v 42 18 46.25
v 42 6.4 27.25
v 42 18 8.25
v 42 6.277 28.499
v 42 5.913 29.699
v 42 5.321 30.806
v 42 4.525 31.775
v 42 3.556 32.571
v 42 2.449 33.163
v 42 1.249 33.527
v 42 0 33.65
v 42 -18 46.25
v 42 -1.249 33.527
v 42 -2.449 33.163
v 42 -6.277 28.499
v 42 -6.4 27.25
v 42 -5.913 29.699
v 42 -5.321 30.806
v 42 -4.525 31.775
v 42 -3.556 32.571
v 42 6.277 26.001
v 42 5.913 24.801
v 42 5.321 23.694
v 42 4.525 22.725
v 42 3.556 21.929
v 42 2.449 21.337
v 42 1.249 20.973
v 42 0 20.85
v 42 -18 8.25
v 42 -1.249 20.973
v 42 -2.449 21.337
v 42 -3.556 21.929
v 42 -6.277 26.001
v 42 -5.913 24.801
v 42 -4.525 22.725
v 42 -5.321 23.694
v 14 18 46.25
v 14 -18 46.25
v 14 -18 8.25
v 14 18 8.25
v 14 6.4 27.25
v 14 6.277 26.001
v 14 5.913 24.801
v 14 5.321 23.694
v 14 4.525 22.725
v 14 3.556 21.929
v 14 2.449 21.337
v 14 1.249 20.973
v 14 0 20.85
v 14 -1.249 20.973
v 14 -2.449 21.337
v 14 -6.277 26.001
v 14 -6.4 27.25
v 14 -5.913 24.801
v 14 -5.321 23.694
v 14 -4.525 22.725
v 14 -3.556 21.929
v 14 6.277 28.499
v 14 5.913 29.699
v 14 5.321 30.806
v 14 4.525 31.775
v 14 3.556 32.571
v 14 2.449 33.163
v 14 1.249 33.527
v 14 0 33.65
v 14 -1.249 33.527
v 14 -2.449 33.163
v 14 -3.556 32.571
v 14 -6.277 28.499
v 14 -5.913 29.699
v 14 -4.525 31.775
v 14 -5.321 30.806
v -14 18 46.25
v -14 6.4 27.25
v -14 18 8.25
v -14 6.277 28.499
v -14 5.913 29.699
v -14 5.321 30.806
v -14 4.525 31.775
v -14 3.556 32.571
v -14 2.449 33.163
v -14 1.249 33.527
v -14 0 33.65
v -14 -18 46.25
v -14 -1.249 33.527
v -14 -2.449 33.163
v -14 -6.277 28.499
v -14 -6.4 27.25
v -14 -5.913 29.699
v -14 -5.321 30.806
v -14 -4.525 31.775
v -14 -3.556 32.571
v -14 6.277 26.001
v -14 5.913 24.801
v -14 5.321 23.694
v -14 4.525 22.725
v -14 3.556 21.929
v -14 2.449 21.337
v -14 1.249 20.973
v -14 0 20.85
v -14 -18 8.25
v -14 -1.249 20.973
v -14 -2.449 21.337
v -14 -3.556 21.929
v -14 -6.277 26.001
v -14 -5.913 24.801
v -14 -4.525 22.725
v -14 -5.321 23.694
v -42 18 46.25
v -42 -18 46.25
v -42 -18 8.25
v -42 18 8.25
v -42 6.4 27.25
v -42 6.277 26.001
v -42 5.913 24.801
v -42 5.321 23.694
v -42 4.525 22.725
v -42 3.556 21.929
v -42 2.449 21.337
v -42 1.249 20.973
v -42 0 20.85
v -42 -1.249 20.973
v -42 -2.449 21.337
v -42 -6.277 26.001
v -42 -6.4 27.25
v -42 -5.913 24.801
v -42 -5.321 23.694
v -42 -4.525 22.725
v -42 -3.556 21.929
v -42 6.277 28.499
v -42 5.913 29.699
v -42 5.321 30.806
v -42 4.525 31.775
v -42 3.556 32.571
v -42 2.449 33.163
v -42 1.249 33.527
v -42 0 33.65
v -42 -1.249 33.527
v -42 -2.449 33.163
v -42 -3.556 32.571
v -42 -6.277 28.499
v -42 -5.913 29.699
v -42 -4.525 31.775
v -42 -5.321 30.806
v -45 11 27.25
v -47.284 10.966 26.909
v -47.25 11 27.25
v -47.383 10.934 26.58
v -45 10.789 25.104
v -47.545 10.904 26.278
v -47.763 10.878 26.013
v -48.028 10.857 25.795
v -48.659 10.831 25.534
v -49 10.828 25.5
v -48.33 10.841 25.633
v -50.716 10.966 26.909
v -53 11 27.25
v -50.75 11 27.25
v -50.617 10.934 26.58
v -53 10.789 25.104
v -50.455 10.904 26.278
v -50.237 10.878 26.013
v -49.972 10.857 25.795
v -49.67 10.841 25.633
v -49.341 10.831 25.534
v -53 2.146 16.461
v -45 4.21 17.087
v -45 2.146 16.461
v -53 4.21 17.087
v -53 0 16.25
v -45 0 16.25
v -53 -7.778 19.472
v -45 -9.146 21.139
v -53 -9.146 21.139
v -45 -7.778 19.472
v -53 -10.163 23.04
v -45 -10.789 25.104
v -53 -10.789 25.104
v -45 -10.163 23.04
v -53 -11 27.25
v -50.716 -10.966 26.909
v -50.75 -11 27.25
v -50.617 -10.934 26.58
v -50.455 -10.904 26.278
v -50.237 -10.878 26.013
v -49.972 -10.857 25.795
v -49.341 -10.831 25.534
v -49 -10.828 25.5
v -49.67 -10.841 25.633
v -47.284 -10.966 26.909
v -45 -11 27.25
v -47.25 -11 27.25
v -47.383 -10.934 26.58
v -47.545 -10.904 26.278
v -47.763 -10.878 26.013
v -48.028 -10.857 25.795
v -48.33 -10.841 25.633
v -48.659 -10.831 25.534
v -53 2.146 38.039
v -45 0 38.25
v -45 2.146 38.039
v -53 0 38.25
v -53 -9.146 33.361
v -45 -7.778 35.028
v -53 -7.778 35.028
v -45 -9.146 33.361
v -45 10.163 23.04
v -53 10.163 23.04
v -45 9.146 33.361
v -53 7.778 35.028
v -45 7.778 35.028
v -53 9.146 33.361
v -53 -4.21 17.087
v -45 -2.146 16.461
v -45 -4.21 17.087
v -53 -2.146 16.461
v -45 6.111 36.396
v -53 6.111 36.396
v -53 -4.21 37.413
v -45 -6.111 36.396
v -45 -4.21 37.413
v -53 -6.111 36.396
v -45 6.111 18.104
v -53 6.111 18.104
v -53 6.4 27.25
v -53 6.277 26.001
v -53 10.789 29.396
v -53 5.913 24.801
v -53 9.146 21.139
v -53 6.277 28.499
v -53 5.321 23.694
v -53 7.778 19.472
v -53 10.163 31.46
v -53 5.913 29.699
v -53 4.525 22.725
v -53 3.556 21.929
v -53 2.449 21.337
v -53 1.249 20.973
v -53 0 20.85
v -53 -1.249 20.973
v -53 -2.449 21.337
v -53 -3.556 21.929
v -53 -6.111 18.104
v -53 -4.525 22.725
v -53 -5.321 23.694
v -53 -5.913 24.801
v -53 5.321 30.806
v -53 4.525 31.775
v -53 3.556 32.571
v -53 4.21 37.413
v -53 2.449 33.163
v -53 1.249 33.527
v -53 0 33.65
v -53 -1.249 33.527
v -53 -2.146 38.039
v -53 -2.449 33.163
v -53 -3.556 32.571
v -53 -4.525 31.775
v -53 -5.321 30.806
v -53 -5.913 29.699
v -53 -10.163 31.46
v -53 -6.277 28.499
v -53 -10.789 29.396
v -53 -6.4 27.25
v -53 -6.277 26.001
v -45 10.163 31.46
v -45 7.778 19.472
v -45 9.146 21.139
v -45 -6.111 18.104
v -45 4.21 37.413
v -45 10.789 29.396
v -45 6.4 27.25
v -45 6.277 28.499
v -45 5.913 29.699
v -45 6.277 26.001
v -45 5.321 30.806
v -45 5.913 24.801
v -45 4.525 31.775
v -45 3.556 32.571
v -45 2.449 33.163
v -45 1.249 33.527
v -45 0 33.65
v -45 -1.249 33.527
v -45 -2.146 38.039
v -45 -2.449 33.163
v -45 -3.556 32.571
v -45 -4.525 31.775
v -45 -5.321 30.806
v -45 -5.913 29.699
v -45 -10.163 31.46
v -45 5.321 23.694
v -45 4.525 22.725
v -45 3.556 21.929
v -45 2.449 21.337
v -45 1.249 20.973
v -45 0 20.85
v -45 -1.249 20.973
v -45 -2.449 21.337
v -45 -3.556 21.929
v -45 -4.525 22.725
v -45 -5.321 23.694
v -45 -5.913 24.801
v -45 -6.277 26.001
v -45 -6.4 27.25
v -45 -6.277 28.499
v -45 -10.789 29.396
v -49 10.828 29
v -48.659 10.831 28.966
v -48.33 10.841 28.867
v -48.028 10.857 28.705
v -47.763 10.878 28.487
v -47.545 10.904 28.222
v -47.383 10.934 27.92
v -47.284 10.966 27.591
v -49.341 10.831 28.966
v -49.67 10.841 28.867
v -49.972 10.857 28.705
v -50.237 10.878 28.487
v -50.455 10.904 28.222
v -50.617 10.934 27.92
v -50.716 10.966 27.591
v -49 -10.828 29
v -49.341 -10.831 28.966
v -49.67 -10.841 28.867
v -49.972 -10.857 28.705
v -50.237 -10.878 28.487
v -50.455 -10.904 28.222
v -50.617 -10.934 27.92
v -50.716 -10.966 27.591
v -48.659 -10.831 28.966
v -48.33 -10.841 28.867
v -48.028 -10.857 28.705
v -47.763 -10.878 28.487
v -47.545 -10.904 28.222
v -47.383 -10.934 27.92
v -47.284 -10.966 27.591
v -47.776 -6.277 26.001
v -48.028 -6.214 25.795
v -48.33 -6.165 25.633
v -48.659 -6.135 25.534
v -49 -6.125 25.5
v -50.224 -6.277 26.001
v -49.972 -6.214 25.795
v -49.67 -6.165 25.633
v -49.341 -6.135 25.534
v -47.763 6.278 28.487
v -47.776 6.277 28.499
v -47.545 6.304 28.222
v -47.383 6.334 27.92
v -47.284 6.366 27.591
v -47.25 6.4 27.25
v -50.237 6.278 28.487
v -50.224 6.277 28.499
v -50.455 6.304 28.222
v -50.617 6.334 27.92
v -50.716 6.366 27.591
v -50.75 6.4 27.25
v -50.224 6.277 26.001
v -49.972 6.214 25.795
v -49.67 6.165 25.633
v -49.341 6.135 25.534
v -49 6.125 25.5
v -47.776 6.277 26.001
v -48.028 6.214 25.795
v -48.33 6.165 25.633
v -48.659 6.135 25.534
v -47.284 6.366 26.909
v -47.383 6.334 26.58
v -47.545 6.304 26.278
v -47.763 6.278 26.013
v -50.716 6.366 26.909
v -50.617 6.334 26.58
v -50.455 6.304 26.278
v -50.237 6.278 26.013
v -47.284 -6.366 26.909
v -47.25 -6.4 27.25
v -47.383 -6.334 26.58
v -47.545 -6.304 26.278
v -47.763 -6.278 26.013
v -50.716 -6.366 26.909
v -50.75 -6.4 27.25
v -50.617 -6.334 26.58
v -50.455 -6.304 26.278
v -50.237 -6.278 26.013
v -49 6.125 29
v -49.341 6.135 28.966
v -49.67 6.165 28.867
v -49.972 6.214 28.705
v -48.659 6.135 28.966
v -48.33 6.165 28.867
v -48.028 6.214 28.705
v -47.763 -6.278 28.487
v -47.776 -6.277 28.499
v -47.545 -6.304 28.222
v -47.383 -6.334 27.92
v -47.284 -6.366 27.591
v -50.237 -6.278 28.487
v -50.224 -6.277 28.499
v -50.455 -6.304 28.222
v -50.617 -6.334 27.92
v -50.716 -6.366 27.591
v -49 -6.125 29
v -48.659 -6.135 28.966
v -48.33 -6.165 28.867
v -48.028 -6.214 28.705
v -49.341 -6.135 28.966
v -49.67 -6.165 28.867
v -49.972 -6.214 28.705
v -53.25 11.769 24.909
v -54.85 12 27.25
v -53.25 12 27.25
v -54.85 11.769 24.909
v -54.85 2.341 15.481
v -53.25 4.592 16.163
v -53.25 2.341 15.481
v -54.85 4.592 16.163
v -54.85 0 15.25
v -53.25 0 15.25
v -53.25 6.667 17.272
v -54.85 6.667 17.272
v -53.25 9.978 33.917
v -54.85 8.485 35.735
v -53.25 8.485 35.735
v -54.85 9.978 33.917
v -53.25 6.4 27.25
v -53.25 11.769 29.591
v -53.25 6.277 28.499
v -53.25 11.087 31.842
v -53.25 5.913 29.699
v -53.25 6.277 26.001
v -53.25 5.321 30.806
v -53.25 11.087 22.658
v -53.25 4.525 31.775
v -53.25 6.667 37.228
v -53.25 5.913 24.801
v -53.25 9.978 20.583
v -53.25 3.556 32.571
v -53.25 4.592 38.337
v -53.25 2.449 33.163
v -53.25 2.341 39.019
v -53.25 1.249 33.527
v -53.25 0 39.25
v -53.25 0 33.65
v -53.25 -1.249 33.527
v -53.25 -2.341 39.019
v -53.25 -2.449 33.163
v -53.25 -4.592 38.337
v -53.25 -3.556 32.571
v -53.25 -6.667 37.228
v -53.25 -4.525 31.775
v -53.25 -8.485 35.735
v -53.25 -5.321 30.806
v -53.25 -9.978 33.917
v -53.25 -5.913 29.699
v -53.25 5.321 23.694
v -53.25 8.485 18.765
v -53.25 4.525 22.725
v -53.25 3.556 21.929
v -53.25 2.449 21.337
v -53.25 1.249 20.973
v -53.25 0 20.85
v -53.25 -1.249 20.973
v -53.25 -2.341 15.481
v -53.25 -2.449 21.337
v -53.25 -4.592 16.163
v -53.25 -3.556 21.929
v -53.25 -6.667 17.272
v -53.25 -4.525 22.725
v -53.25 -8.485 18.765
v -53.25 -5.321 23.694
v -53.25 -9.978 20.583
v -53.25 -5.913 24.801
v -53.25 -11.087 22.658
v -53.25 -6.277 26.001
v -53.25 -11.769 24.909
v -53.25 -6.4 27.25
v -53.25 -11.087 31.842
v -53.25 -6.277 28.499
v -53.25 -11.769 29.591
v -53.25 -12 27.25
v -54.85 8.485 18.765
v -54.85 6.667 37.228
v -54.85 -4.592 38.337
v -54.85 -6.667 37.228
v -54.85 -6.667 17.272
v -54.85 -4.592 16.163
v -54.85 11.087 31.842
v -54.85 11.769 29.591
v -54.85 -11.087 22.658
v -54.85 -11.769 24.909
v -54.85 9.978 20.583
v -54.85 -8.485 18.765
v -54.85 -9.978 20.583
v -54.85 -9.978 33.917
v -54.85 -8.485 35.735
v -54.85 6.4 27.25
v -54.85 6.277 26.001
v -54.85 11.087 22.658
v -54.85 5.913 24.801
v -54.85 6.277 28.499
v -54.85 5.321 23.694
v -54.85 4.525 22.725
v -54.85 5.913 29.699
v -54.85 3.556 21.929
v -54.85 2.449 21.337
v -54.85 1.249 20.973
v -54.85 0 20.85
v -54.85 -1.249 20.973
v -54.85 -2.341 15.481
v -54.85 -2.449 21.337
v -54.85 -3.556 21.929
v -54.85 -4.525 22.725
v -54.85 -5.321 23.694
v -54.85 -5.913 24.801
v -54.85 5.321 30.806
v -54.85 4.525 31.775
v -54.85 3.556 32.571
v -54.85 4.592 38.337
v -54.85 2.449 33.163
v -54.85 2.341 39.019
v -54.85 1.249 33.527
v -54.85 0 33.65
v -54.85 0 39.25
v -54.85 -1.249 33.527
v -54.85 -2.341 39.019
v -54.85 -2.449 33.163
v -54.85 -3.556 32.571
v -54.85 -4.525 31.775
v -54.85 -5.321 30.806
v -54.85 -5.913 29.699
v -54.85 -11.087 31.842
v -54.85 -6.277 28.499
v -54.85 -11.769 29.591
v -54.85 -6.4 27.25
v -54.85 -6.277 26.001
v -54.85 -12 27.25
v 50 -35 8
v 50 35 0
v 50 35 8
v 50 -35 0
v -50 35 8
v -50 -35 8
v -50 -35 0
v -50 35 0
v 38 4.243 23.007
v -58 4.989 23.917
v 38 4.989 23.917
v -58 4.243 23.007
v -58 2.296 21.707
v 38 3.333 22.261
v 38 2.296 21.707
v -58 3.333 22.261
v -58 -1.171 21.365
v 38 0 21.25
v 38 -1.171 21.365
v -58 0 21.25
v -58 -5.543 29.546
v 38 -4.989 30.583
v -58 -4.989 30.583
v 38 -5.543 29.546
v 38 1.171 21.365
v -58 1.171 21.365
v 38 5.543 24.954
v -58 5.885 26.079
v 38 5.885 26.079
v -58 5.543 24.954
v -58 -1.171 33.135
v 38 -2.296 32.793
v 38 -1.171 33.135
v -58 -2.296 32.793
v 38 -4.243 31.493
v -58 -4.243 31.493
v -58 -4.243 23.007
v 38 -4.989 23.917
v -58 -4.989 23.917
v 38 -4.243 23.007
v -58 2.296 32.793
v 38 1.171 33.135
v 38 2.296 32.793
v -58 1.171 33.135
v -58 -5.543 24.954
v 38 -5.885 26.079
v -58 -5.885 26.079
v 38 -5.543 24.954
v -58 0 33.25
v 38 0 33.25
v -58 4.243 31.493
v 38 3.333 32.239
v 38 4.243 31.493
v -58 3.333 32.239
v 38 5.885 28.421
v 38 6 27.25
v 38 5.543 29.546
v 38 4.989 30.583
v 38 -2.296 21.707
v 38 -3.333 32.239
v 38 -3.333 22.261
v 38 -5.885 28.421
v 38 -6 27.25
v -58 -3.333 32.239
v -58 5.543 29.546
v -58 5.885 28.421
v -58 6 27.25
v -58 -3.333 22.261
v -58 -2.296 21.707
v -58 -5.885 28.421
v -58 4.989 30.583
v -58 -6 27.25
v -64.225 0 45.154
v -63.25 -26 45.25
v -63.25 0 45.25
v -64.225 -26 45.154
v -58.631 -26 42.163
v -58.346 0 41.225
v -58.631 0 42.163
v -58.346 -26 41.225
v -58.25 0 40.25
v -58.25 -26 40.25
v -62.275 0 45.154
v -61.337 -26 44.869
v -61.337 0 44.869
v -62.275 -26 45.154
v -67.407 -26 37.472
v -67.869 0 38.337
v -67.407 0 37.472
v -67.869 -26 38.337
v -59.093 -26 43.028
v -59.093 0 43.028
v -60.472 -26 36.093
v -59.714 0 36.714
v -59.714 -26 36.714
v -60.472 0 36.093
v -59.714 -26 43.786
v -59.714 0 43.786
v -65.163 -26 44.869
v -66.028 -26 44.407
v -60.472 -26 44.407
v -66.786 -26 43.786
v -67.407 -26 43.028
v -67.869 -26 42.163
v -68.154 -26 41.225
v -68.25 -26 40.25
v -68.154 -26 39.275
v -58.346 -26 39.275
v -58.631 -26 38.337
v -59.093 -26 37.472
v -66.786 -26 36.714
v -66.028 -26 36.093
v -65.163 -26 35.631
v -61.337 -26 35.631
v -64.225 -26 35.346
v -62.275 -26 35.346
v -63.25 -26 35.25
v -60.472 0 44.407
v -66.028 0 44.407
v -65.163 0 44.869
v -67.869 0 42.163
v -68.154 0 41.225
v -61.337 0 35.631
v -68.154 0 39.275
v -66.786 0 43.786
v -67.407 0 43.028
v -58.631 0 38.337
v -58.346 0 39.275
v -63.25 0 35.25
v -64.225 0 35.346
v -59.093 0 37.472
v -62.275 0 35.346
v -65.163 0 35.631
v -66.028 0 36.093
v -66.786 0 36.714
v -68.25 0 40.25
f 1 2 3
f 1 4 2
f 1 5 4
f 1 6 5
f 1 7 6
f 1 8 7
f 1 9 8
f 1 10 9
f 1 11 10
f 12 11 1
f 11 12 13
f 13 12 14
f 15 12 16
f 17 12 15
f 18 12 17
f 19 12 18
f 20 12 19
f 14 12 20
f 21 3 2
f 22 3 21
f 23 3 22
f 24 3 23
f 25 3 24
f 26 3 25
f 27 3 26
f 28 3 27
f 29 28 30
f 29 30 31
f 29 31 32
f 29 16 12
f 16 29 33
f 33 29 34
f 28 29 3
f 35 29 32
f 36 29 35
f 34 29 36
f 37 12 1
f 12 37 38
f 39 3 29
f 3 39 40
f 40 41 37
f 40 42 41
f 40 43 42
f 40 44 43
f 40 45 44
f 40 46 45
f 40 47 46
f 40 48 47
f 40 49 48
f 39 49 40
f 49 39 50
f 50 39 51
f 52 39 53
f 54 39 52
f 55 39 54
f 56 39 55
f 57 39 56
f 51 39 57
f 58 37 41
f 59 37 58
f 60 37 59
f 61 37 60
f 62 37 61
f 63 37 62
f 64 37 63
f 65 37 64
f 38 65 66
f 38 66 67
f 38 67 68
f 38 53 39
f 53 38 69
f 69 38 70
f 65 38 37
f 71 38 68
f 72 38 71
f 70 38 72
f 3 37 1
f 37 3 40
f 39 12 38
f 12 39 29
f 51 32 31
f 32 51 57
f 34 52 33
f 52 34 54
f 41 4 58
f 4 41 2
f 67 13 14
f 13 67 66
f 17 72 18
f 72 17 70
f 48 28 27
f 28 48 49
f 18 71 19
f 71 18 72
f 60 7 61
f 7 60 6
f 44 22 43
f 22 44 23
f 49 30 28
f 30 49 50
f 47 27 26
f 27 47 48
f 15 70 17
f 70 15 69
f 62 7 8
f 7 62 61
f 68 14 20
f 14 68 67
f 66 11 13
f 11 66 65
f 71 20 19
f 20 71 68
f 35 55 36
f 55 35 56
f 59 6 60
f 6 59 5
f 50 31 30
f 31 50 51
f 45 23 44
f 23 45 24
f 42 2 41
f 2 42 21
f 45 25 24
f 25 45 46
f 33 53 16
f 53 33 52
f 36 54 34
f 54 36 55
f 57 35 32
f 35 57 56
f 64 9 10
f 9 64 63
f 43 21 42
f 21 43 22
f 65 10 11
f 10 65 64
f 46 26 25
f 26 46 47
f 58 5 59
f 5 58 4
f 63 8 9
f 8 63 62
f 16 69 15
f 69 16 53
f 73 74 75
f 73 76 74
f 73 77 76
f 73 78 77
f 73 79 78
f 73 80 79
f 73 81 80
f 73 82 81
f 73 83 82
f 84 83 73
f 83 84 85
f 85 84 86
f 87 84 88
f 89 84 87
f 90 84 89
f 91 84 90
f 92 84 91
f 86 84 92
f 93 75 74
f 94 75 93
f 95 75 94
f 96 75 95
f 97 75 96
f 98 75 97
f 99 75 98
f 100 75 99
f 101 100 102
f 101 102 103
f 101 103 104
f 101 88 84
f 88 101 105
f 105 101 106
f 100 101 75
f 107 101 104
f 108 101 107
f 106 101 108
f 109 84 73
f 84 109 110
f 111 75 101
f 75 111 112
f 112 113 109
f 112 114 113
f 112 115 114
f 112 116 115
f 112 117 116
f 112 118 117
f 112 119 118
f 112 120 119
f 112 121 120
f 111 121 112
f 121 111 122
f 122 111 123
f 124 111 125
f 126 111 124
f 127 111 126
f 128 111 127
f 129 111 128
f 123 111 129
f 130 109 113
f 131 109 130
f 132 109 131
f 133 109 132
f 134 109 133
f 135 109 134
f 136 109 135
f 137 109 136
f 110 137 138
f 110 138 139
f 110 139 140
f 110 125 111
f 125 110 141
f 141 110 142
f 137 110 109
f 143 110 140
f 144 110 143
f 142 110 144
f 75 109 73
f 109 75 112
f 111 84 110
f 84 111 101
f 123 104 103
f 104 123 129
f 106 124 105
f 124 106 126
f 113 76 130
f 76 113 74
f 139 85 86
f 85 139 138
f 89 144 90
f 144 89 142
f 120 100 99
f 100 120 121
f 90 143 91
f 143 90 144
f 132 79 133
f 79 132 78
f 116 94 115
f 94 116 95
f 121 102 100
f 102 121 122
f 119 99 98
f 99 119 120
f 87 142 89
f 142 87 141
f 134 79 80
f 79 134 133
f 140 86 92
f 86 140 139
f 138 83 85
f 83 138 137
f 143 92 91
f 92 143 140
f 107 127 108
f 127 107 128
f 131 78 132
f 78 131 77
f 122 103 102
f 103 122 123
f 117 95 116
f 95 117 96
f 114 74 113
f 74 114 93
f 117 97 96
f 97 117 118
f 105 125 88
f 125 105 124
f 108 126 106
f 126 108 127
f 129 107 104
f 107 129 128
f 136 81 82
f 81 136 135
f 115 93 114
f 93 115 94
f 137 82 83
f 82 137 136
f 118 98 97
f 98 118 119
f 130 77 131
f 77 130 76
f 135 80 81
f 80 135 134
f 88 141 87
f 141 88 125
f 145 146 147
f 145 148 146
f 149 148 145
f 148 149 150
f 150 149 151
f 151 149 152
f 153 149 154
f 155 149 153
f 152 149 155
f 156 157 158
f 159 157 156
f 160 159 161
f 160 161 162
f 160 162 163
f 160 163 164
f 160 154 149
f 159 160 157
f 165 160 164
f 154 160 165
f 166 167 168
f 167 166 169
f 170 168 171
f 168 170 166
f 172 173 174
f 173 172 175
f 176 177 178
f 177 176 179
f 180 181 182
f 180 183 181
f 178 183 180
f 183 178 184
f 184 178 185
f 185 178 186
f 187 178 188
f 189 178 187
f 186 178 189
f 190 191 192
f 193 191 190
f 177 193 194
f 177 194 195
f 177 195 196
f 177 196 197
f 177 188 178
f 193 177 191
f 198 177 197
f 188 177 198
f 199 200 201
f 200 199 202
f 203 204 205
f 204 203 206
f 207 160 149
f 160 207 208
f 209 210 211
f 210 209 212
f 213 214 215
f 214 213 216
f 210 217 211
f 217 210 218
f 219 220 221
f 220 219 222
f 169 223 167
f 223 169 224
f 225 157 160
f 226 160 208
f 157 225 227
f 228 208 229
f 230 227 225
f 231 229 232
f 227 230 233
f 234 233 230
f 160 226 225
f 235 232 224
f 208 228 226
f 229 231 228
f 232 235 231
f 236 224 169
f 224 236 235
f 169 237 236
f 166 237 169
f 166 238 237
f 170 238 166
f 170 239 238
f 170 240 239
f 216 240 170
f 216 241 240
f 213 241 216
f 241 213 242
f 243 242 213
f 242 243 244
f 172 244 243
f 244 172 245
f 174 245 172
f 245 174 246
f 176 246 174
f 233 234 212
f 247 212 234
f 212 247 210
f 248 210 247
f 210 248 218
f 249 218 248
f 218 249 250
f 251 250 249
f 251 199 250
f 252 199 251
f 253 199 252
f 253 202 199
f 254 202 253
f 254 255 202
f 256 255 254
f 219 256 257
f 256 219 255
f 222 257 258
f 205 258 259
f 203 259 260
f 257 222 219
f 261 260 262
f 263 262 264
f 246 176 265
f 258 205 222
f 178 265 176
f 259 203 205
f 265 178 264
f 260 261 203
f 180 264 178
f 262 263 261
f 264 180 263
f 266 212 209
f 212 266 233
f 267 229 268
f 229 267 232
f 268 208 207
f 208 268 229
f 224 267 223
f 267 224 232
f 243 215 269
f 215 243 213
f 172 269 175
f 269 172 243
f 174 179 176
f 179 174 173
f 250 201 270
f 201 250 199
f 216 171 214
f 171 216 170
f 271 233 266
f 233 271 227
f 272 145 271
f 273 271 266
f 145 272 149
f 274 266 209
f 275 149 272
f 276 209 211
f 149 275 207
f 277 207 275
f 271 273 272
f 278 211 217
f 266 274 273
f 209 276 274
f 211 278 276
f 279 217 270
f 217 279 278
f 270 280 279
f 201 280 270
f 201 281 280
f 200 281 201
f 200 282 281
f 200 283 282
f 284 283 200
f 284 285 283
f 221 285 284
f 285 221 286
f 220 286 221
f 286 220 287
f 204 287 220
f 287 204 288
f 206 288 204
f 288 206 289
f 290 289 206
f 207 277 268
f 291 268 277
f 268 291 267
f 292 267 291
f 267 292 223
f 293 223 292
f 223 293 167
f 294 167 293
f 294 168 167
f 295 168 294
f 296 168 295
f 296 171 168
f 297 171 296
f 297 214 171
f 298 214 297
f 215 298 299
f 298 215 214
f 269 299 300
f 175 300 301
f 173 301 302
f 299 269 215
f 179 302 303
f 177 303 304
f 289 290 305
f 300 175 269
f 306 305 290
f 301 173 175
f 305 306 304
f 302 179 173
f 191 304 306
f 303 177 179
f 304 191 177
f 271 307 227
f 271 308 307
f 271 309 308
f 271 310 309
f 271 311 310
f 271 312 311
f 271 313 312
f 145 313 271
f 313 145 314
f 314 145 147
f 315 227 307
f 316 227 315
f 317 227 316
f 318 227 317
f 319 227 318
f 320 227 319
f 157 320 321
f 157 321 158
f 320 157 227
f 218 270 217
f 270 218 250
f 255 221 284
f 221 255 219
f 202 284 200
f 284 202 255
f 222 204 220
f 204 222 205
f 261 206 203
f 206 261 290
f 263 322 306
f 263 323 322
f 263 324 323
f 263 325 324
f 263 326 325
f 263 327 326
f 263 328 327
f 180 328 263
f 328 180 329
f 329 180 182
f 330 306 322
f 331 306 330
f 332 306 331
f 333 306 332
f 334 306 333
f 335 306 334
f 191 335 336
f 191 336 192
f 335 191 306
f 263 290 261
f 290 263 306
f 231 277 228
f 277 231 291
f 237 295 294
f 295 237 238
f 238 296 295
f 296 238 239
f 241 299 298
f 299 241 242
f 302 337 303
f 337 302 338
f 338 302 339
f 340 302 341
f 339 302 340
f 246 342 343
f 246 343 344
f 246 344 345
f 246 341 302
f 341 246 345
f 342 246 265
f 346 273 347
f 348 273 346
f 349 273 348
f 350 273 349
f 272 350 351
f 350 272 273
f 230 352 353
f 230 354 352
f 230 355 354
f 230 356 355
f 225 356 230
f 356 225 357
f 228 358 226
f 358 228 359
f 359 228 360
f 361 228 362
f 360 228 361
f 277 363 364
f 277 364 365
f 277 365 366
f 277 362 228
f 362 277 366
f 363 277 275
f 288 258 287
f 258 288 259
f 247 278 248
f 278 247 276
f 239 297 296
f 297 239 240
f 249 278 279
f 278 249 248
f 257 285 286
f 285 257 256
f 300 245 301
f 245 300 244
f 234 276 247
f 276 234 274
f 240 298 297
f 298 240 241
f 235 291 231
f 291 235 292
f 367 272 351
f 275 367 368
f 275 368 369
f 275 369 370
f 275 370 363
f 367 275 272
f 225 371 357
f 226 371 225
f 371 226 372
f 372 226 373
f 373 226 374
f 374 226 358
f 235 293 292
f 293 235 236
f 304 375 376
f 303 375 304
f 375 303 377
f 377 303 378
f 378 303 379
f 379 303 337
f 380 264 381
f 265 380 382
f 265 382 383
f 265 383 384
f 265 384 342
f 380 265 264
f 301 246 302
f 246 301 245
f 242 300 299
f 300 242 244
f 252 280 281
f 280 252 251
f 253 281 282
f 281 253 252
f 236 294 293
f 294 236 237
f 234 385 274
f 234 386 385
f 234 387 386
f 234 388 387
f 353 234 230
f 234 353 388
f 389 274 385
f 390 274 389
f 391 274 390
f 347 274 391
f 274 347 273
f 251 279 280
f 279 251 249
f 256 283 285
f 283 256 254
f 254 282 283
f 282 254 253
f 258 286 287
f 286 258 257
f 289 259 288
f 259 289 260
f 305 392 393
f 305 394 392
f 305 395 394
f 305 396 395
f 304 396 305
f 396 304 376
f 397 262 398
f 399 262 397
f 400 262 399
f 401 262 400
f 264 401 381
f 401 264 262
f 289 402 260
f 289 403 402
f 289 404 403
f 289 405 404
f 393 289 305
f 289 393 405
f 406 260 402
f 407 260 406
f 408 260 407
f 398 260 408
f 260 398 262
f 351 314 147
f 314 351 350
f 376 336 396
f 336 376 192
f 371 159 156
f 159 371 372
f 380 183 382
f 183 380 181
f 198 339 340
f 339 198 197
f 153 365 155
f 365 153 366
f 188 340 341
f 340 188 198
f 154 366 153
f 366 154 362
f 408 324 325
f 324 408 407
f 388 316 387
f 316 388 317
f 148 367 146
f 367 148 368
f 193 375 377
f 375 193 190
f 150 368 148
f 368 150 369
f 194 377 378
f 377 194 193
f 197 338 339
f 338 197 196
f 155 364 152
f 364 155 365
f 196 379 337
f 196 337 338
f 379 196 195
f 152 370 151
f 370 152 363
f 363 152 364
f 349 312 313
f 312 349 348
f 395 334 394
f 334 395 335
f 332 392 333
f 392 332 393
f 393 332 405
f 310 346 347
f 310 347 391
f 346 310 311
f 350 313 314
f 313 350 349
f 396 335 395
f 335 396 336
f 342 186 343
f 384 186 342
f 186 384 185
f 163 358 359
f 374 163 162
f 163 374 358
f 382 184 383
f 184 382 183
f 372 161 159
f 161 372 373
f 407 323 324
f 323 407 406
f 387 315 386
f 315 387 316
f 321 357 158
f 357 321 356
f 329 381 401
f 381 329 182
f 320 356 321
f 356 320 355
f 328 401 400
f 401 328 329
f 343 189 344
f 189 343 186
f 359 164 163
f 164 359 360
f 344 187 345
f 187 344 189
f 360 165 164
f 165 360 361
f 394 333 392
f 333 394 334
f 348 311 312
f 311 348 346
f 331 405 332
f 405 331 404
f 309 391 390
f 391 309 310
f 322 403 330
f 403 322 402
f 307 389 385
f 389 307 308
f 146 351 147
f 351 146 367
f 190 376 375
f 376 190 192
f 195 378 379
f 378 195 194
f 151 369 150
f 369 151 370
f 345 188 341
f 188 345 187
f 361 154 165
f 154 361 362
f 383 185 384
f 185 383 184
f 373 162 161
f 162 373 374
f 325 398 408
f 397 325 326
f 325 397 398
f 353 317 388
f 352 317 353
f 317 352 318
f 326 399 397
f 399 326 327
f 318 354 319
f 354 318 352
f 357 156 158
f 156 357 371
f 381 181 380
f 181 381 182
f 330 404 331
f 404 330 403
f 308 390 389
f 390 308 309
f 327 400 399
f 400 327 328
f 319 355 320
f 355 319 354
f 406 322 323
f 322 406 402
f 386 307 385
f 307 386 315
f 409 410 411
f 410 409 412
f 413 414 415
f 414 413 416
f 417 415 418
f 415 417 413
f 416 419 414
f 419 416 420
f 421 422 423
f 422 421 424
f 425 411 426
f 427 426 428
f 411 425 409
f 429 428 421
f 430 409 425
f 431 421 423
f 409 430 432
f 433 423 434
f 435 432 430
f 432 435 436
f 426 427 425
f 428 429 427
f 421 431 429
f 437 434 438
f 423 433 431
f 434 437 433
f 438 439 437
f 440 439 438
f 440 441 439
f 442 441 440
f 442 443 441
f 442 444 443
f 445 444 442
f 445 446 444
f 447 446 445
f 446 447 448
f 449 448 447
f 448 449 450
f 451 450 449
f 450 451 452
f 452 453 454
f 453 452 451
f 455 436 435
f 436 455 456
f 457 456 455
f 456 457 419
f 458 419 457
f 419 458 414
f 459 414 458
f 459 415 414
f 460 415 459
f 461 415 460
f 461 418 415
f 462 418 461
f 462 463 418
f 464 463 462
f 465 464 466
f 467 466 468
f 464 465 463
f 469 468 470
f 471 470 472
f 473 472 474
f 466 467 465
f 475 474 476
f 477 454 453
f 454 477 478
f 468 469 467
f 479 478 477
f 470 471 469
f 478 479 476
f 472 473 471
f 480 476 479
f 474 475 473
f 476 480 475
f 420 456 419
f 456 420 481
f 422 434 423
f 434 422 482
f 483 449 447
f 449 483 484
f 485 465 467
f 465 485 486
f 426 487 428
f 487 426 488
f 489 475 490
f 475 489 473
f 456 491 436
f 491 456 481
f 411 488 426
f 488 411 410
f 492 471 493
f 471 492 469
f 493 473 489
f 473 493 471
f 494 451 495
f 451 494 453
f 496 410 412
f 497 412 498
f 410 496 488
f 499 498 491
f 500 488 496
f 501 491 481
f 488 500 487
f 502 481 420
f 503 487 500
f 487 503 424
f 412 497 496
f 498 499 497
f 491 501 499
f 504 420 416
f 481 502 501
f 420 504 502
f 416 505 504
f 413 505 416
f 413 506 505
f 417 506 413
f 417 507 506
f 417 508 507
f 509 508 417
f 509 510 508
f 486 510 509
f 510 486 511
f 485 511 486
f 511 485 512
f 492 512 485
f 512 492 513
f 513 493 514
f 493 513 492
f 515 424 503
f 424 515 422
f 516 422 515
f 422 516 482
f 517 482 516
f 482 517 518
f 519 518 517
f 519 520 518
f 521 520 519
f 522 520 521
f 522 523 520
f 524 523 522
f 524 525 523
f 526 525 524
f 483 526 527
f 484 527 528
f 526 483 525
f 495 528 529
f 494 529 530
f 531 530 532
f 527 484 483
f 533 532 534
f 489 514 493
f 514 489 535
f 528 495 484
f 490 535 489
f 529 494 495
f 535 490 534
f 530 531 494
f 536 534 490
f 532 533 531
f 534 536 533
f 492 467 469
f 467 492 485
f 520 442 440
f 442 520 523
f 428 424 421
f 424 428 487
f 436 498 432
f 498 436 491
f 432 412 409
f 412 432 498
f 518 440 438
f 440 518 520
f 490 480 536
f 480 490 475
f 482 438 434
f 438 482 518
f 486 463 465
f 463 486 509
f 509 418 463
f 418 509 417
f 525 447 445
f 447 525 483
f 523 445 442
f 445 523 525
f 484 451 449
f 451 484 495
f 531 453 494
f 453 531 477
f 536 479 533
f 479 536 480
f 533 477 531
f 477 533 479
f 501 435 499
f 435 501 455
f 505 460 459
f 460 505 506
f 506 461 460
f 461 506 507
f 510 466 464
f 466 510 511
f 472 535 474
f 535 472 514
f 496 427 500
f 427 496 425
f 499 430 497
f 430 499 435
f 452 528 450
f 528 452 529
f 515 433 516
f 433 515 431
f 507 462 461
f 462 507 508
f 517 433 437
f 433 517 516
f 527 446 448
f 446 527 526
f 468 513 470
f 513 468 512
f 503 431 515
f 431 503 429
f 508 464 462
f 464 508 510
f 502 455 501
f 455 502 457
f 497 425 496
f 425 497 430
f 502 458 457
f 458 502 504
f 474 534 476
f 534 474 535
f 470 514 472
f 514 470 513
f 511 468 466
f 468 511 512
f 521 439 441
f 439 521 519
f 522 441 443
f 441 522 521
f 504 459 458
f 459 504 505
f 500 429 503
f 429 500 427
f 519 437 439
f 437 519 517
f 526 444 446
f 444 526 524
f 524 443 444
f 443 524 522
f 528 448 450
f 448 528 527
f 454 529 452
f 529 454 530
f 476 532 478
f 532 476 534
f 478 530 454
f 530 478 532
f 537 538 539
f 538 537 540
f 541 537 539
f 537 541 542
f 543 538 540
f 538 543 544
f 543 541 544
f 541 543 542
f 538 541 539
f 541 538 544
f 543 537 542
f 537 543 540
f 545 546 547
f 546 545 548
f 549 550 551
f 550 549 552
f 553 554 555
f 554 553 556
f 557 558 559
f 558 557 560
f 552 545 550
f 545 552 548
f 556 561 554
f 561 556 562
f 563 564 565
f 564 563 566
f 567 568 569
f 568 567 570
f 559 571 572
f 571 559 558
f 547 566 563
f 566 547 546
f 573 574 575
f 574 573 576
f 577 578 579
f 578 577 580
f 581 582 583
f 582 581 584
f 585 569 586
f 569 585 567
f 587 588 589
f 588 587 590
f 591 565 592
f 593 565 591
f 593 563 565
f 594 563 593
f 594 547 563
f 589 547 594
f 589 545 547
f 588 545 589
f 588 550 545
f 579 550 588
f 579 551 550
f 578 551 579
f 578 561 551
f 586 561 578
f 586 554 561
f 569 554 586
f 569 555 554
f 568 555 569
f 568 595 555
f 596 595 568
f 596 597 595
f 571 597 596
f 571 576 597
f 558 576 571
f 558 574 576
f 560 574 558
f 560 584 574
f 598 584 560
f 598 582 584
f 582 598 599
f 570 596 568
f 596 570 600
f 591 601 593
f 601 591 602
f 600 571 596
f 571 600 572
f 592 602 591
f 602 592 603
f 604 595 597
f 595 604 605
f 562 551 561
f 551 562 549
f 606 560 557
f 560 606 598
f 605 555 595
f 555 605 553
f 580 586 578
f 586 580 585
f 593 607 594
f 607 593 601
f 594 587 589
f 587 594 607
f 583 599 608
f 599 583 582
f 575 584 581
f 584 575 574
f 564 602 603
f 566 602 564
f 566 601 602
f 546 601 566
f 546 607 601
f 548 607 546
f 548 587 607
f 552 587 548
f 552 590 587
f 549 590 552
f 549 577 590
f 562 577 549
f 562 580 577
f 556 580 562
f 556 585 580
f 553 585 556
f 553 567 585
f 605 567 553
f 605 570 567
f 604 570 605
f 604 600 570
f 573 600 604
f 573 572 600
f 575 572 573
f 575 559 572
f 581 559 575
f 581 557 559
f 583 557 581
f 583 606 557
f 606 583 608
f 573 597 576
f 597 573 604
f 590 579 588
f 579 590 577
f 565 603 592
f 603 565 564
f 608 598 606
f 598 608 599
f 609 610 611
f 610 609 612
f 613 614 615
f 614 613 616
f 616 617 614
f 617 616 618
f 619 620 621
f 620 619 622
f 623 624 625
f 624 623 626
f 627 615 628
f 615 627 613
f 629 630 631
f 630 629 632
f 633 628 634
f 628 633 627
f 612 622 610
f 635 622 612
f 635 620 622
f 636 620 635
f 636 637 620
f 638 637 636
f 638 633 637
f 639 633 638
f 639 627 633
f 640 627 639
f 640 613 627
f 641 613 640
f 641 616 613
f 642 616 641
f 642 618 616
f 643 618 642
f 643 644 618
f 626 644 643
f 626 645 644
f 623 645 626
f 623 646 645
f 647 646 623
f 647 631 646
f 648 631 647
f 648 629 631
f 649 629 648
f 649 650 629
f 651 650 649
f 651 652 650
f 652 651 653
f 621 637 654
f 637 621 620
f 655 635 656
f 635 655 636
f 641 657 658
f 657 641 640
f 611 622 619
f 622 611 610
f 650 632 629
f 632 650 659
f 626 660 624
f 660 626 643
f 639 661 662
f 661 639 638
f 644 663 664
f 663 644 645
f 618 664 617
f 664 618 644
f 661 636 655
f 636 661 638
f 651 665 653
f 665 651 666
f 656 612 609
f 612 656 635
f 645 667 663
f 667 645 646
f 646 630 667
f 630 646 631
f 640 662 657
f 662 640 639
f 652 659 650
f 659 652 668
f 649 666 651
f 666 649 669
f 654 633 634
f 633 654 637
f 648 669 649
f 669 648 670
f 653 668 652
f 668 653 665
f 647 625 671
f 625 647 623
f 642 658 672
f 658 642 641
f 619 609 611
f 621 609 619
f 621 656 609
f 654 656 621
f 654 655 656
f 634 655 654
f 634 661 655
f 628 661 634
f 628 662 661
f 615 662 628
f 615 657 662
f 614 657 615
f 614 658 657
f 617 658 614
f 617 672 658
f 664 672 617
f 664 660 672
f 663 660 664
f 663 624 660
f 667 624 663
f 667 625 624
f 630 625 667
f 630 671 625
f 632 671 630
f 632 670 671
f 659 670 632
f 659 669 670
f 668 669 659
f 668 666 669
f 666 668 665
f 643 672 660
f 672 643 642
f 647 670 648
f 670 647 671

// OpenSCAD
$fn = 32;

// ------------------------------------------------------------------------
// Machine vise: screw d12, jaws 28 x 38 mm
// Every part is its own module, assembly() places every instance.
// ------------------------------------------------------------------------

// --- part 1 ---
module vise_bed() {
  difference() {
    translate([-50, -35, 0]) cube([100, 70, 8]);
  }
}

// --- part 2 ---
module vise_jaw() {
  difference() {
    translate([-14, -18, 0]) cube([28, 36, 38]);
    translate([0, 0, 19]) rotate([0, 90, 0]) cylinder(h = 30, d = 12.8, center = true);
  }
}

// --- part 3 ---
module vise_screw() {
  translate([0, 0, -48]) cylinder(h = 96, d = 12);
}

// --- part 4 ---
module screw_collar() {
  difference() {
    cylinder(h = 8, d = 22);
    translate([0, 0, -1]) cylinder(h = 10, d = 12.8);
    translate([0, 0, 4]) rotate([90, 0, 0]) cylinder(h = 24, d = 3.5, center = true);
  }
}

// --- part 5 ---
module screw_washer() {
  difference() {
      translate([0, 0, 0]) cylinder(h = 1.6, d = 24);
      translate([0, 0, -1]) cylinder(h = 3.6, d = 12.8);
    }
}

// --- part 6 ---
module vise_handle() {
  cylinder(h = 26, d = 10);
}

// --- assembly ---
module assembly() {
  color([0.80, 0.24, 0.20]) translate([0, 0, 0]) rotate([0, 0, 0]) vise_bed();
  color([0.20, 0.45, 0.75]) translate([28, 0, 8.25]) rotate([0, 0, 0]) vise_jaw();
  color([0.25, 0.62, 0.32]) translate([-28, 0, 8.25]) rotate([0, 0, 0]) vise_jaw();
  color([0.92, 0.70, 0.18]) translate([-10, 0, 27.25]) rotate([0, 90, 0]) vise_screw();
  color([0.58, 0.35, 0.70]) translate([-53, 0, 27.25]) rotate([0, 90, 0]) screw_collar();
  color([0.16, 0.66, 0.66]) translate([-54.85, 0, 27.25]) rotate([0, 90, 0]) screw_washer();
  color([0.85, 0.48, 0.18]) translate([-63.25, 0, 40.25]) rotate([90, 0, 0]) vise_handle();
}

assembly();
